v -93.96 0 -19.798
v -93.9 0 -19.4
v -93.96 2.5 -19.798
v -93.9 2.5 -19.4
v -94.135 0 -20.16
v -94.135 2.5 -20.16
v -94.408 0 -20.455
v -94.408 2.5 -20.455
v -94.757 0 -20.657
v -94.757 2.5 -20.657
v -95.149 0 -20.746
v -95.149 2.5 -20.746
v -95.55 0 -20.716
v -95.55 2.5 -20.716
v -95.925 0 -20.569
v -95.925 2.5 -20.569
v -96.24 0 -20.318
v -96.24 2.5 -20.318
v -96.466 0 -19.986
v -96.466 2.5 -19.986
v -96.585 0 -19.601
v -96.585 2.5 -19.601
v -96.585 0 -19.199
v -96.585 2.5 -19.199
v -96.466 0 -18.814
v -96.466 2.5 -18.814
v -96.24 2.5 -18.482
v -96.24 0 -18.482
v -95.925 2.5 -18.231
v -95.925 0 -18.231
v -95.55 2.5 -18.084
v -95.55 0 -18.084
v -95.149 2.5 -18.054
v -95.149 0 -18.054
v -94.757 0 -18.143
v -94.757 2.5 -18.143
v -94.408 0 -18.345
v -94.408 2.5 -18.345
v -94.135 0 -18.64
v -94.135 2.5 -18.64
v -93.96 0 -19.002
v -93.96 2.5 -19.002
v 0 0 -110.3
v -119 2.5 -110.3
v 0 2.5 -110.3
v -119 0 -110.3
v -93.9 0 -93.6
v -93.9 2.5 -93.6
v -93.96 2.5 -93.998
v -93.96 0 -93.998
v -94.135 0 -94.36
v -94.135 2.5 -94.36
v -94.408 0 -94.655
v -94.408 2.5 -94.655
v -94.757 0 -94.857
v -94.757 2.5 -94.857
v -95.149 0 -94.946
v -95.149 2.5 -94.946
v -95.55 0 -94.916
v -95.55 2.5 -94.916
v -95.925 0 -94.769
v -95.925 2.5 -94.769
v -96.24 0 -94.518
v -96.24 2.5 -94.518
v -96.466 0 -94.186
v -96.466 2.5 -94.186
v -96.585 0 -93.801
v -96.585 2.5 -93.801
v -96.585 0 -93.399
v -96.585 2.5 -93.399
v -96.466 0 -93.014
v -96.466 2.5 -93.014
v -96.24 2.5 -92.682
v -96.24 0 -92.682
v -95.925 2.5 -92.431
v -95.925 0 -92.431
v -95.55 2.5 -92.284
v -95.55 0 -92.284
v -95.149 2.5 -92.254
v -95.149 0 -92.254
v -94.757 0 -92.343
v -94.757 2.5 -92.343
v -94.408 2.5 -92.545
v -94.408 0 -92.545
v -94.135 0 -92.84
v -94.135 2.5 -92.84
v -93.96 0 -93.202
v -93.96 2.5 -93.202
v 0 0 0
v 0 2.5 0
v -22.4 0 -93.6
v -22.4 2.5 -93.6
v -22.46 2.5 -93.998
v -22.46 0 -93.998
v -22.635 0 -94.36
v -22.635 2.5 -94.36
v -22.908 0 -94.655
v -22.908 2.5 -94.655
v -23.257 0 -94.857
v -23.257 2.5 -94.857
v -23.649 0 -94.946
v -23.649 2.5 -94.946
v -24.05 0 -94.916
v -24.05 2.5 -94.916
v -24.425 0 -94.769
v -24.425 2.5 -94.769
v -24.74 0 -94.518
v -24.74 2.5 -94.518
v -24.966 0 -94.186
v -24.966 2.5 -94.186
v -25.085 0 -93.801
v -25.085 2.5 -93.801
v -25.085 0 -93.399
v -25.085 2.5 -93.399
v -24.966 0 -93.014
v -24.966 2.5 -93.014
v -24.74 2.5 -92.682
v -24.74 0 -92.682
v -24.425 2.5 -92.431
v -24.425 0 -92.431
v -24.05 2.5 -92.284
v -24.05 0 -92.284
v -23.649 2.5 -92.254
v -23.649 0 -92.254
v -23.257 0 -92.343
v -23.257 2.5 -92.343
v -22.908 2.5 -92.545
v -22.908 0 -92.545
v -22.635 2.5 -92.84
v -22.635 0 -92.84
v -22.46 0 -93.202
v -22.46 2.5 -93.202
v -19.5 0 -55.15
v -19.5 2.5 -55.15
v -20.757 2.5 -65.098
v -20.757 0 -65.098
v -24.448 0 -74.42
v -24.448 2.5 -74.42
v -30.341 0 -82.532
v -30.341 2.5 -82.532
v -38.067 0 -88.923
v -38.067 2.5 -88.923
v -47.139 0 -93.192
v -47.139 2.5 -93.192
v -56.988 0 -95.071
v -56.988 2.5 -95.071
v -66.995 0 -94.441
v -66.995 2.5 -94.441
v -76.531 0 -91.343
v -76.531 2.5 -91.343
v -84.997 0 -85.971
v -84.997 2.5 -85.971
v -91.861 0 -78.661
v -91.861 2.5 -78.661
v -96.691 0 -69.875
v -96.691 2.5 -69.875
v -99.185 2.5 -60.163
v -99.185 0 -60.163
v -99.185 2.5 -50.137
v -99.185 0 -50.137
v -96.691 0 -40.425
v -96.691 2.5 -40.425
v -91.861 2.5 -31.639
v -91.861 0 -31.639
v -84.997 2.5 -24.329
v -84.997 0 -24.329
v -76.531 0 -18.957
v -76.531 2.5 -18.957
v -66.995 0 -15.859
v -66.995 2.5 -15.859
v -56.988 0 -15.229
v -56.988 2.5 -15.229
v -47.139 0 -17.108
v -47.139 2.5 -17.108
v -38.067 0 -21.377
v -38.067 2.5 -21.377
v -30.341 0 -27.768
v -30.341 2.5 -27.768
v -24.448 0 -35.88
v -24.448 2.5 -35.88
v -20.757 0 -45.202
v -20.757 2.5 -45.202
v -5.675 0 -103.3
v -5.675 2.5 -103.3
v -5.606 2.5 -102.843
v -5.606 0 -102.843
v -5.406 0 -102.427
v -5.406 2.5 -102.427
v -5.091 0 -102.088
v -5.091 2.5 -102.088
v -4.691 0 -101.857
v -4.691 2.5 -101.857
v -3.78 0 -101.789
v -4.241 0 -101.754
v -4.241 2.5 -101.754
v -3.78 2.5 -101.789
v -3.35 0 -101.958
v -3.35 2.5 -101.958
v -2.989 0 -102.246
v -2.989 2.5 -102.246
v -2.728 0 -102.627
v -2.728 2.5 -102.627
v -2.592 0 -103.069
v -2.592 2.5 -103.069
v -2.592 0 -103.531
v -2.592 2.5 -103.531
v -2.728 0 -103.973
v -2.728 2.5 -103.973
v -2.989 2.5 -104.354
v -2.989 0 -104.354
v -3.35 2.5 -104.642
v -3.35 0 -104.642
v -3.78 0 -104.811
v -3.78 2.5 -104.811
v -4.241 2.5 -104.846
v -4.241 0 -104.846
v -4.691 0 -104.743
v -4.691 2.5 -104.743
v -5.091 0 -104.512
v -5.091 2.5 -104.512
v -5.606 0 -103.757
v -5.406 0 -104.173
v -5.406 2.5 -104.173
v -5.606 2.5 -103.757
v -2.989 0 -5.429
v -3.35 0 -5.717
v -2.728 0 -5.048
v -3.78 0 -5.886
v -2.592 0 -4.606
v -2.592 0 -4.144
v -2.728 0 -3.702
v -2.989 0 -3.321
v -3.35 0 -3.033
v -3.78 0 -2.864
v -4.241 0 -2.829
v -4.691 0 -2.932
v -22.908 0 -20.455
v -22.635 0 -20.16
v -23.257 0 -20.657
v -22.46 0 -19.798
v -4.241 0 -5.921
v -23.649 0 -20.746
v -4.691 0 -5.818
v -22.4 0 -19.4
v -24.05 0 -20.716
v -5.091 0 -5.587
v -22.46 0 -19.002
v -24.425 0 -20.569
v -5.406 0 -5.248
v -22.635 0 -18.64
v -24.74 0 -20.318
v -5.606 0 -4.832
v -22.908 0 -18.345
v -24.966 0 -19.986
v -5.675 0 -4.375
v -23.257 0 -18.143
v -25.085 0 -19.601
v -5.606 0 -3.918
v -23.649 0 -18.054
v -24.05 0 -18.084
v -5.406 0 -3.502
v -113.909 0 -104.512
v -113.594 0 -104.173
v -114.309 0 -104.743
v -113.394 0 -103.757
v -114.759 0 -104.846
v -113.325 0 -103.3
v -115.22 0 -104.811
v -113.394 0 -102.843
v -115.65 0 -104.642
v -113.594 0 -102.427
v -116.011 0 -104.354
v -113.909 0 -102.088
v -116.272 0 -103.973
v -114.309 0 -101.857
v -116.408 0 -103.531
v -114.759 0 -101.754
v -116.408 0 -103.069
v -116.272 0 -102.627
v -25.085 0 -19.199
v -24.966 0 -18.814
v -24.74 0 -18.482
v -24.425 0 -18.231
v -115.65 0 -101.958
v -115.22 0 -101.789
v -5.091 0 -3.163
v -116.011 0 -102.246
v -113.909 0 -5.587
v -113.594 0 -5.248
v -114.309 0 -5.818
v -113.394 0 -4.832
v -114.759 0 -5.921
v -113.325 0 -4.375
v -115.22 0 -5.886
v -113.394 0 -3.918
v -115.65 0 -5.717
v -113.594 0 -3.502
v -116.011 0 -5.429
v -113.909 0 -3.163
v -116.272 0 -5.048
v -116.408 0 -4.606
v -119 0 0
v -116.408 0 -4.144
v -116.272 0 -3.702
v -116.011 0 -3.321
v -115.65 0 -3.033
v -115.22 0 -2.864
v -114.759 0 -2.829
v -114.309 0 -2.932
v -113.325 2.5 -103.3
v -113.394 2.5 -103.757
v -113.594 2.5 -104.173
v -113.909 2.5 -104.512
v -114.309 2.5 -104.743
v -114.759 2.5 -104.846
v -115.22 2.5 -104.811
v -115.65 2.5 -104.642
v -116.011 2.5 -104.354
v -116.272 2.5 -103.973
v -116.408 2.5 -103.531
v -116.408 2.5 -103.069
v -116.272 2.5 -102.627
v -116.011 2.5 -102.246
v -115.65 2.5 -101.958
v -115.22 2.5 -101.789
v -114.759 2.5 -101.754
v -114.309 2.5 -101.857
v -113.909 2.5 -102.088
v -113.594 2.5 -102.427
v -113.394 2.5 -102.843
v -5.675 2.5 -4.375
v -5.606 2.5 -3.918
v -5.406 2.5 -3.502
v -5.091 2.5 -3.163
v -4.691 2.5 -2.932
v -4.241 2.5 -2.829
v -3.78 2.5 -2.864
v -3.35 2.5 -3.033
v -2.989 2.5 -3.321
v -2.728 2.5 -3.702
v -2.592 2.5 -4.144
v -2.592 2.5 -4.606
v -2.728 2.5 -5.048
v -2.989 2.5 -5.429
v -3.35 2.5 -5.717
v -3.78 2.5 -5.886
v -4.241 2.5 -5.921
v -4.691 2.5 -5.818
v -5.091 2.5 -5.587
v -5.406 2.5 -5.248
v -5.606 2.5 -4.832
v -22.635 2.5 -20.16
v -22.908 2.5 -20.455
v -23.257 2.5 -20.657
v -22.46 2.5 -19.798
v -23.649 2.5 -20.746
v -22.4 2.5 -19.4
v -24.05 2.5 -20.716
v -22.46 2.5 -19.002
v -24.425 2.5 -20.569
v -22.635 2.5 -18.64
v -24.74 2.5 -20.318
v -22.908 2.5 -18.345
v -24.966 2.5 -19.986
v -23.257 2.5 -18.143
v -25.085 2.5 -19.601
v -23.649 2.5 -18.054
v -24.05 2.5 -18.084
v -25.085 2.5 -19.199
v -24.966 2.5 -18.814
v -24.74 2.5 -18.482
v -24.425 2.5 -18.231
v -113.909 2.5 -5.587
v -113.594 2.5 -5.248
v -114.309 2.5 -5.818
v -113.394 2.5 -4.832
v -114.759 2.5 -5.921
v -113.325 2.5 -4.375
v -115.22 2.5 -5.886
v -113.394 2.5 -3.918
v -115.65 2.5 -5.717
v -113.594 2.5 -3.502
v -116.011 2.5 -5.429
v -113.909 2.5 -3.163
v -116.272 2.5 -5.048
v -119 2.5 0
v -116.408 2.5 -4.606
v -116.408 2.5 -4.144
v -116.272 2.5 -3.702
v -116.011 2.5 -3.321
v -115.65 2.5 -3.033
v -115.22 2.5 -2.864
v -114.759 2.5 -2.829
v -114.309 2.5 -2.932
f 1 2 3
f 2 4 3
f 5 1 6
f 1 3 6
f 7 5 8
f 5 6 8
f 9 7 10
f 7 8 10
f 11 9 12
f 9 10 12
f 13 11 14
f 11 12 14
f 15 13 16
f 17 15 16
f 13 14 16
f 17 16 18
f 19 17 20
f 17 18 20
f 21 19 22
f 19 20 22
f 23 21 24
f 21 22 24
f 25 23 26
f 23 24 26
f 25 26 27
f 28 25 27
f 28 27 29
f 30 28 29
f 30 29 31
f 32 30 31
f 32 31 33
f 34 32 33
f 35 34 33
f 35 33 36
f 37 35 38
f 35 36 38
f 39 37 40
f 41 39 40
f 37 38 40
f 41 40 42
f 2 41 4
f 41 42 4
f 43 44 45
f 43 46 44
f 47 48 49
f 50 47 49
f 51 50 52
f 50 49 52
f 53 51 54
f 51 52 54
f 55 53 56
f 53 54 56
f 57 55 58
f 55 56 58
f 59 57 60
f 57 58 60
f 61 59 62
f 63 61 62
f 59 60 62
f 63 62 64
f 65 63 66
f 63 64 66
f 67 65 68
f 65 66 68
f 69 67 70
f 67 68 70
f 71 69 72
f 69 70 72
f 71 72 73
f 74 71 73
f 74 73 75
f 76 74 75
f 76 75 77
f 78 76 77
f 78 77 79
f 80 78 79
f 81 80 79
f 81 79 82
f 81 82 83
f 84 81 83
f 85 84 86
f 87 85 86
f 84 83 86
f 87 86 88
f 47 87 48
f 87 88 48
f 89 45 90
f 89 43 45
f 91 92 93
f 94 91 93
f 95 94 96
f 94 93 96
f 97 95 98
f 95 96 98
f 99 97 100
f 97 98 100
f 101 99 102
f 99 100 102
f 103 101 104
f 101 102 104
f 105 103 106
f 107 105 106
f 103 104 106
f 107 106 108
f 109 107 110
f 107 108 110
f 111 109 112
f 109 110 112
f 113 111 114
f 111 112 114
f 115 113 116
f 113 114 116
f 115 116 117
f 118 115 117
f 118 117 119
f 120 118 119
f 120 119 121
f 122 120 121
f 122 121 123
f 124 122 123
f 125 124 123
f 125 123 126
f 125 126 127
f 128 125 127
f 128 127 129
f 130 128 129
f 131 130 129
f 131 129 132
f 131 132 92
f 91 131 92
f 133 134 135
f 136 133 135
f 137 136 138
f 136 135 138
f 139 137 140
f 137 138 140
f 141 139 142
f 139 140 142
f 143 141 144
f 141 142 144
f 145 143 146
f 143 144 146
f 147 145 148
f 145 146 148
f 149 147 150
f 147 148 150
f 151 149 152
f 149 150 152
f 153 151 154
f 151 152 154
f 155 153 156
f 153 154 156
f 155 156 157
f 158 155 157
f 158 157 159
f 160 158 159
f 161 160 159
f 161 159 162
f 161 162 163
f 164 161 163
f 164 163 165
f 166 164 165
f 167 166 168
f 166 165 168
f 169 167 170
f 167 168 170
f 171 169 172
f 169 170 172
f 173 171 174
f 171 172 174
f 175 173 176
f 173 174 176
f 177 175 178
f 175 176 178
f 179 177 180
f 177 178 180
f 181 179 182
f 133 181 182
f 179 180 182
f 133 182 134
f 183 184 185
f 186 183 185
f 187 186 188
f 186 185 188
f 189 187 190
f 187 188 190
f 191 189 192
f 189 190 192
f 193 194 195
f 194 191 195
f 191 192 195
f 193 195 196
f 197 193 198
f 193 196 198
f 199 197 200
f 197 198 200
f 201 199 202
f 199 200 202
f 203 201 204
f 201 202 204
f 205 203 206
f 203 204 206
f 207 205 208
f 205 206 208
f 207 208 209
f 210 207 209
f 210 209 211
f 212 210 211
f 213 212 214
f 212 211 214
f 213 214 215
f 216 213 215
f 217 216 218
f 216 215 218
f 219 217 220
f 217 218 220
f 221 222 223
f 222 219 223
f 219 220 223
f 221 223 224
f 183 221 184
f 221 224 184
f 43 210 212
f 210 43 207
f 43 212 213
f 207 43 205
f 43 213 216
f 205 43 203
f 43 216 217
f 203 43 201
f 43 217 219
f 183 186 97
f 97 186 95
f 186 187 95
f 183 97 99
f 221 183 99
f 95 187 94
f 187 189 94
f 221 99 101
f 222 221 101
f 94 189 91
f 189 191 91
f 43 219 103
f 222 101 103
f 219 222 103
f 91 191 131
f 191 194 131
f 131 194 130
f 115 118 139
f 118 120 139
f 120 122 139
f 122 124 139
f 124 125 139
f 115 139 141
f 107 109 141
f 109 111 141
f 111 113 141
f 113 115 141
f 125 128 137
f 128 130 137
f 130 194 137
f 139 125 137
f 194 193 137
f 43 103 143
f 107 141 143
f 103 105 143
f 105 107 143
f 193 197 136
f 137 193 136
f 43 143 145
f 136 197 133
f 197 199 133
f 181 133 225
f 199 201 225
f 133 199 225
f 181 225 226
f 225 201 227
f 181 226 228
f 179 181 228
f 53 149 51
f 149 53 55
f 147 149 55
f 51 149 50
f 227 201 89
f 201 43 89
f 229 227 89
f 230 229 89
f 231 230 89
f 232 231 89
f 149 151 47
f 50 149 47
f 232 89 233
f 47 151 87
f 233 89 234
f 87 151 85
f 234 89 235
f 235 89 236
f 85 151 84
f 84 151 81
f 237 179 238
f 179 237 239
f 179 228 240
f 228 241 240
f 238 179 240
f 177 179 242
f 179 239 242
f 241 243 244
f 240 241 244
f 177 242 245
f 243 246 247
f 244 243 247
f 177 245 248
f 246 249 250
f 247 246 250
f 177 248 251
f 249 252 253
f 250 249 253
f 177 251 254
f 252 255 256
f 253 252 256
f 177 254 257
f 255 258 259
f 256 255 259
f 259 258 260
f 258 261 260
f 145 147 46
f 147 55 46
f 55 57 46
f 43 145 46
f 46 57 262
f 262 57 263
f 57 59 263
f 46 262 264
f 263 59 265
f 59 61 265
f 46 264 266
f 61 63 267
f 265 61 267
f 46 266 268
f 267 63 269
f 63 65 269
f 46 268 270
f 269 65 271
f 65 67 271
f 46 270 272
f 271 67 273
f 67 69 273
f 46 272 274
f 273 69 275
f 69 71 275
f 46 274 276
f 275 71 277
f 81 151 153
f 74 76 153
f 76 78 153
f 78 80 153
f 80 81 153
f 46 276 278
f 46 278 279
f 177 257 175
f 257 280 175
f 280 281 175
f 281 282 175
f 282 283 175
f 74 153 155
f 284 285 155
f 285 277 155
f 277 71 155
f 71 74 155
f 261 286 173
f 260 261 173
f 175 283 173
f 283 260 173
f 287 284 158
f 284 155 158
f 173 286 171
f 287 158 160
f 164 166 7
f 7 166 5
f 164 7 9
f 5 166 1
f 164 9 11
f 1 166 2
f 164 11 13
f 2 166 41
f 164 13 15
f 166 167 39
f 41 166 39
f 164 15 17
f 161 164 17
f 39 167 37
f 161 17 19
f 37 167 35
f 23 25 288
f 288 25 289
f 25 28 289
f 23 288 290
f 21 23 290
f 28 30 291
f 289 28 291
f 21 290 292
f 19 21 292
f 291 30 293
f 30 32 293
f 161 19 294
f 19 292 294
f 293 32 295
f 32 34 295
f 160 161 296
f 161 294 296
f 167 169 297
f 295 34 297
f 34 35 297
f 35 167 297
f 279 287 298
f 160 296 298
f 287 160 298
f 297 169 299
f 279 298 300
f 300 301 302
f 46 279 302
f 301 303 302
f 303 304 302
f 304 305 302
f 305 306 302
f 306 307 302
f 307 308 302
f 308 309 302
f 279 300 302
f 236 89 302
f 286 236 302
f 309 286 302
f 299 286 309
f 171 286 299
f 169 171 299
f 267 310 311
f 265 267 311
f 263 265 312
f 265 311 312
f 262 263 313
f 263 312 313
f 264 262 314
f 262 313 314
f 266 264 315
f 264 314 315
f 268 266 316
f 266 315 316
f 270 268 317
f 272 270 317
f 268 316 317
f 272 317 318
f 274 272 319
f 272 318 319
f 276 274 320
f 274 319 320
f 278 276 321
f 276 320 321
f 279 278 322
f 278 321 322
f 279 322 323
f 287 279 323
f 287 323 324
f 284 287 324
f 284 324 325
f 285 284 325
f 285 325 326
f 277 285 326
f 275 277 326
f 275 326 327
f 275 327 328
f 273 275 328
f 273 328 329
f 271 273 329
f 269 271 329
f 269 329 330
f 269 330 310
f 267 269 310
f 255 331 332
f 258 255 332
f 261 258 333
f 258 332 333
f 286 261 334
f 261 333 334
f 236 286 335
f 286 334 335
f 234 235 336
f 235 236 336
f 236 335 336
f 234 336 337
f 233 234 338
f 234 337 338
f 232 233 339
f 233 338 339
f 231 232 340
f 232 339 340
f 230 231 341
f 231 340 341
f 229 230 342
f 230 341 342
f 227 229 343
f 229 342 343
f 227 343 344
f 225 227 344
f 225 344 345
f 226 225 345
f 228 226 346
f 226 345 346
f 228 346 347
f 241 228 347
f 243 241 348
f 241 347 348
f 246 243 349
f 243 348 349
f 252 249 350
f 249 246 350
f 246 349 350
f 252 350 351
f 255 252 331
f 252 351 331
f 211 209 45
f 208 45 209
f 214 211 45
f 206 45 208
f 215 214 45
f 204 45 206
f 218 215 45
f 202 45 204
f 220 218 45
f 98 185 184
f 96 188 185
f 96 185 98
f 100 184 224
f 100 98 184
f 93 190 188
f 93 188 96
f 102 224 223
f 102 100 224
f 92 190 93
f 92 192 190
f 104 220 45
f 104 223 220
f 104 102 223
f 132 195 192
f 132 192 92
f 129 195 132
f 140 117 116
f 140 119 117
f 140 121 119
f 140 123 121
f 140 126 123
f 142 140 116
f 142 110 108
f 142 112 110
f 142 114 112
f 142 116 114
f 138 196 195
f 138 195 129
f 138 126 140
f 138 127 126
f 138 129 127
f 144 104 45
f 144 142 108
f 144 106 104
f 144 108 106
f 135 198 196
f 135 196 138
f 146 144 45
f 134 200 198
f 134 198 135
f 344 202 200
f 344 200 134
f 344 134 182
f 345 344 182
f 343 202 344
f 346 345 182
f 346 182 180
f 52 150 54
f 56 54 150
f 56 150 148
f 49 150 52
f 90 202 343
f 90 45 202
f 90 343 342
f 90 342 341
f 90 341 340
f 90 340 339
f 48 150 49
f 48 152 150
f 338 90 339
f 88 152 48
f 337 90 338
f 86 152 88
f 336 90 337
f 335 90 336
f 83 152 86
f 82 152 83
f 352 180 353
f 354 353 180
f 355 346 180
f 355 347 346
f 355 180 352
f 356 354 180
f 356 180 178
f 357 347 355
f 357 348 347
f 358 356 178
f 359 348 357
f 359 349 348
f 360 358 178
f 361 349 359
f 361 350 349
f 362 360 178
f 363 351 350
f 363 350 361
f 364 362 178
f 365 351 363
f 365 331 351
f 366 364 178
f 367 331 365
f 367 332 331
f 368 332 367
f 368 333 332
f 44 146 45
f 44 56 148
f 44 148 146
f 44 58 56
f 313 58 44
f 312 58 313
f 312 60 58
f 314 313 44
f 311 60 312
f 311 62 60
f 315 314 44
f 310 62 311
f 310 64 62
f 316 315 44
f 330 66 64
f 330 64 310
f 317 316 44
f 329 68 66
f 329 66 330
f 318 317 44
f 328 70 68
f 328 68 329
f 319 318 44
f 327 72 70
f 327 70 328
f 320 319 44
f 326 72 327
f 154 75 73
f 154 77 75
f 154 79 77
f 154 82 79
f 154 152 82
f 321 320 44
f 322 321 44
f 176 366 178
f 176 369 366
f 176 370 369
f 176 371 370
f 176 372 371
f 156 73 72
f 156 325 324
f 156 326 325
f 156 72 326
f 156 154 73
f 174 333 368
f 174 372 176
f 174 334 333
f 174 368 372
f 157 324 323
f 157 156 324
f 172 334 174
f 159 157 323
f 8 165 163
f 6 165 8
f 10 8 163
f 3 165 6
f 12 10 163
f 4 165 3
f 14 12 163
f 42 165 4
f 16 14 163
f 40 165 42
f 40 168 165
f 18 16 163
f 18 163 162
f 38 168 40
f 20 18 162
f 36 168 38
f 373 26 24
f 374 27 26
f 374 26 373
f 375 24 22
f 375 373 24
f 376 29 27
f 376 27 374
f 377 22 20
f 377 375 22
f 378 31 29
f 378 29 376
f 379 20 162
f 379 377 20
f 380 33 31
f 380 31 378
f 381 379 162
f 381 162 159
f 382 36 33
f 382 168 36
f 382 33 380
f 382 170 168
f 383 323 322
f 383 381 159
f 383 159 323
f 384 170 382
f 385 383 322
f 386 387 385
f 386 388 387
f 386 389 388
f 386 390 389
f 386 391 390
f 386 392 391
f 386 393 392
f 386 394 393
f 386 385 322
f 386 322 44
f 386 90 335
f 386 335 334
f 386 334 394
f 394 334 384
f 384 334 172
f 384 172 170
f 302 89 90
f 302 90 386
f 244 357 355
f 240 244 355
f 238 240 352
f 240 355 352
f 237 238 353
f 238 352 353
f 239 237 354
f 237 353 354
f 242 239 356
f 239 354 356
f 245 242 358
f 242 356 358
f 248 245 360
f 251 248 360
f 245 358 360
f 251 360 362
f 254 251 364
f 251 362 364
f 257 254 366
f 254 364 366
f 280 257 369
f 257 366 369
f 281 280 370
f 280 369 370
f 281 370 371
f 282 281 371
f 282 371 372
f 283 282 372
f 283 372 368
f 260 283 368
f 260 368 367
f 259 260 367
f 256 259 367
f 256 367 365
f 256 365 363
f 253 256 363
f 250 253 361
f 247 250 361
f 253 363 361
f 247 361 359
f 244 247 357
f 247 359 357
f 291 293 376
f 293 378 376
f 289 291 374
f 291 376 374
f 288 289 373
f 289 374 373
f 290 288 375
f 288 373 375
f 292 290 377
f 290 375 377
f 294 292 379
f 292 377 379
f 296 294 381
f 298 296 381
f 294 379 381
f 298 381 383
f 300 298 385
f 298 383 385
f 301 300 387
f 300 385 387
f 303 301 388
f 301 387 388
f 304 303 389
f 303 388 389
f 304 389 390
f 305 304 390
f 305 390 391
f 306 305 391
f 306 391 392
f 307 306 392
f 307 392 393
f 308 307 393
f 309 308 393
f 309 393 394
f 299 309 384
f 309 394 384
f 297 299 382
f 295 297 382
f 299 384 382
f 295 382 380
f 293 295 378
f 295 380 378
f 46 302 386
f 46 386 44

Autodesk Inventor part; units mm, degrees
ref_plane "YZ Plane" through (0, 0, 0) normal (1, 0, 0) x (0, 1, 0)
ref_plane "XZ Plane" through (0, 0, 0) normal (0, 1, 0) x (-1, 0, 0)
sketch "Sketch1" plane through (0, 0, 0) normal (0, 1, 0) x (-1, 0, 0)
  line L0 (0, 0) -> (119, 0)
  line L1 (119, 0) -> (119, -110.3)
  line L2 (119, -110.3) -> (0, -110.3)
  line L3 (0, -110.3) -> (0, 0)
  dimension "d0" = 119
  dimension "d1" = 110.3
extrude "Extrusion1" add sketch "Sketch1" along normal blind 2.5
sketch "Sketch2" plane through (0, 2.5, 0) normal (0, 1, 0) x (1, 0, 0)
  line L0 (-119, 0) -> (0, 0) projected
  line L1 (0, 0) -> (0, 110.3) projected
  line L2 (0, 110.3) -> (-119, 110.3) projected
  line L3 (-119, 110.3) -> (-119, 0) projected
  circle A0 centre (-114.875, 4.375) radius 1.55
  circle A1 centre (-114.875, 103.3) radius 1.55
  dimension "d4" = 3.1
  dimension "d5" = 4.125
  dimension "d6" = 4.375
  dimension "d7" = 3.1
  dimension "d8" = 7
extrude "Extrusion2" cut sketch "Sketch2" against normal blind 2.5 contours A0 | A1
ref_plane "Work Plane1" through (-59.5, 0, 0) normal (1, 0, 0) x (0, 0, -1)
mirror "Mirror1" about plane through (-59.5, 0, 0) normal (1, 0, 0) of "Extrusion2"
sketch "Sketch3" plane through (0, 2.5, 0) normal (0, 1, 0) x (1, 0, 0)
  circle A0 centre (-4.125, 4.375) radius 1.55 projected
  circle A1 centre (-4.125, 103.3) radius 1.55 projected
  circle A2 centre (-114.875, 4.375) radius 1.55 projected
  circle A3 centre (-114.875, 103.3) radius 1.55 projected
  line L0 (-119, 0) -> (0, 0) projected
  line L1 (0, 0) -> (0, 110.3) projected
  line L2 (0, 110.3) -> (-119, 110.3) projected
  line L3 (-119, 110.3) -> (-119, 0) projected
  circle A4 centre (-59.5, 55.15) radius 40
  circle A5 centre (-23.75, 19.4) radius 1.35
  circle A6 centre (-95.25, 19.4) radius 1.35
  circle A7 centre (-95.25, 93.6) radius 1.35
  circle A8 centre (-23.75, 93.6) radius 1.35
  dimension "d16" = 2.7
  dimension "d17" = 2.7
  dimension "d18" = 2.7
  dimension "d19" = 2.7
  dimension "d30" = 71.5
  dimension "d31" = 71.5
  dimension "d32" = 71.5
  dimension "d34" = 35.75
  dimension "d35" = 35.75
  dimension "d36" = 35.75
extrude "Extrusion3" cut sketch "Sketch3" against normal blind 2.5 contours A4 | A5 | A6 | A7 | A8
properties part number "Base Cover Right 6010 Fan"
